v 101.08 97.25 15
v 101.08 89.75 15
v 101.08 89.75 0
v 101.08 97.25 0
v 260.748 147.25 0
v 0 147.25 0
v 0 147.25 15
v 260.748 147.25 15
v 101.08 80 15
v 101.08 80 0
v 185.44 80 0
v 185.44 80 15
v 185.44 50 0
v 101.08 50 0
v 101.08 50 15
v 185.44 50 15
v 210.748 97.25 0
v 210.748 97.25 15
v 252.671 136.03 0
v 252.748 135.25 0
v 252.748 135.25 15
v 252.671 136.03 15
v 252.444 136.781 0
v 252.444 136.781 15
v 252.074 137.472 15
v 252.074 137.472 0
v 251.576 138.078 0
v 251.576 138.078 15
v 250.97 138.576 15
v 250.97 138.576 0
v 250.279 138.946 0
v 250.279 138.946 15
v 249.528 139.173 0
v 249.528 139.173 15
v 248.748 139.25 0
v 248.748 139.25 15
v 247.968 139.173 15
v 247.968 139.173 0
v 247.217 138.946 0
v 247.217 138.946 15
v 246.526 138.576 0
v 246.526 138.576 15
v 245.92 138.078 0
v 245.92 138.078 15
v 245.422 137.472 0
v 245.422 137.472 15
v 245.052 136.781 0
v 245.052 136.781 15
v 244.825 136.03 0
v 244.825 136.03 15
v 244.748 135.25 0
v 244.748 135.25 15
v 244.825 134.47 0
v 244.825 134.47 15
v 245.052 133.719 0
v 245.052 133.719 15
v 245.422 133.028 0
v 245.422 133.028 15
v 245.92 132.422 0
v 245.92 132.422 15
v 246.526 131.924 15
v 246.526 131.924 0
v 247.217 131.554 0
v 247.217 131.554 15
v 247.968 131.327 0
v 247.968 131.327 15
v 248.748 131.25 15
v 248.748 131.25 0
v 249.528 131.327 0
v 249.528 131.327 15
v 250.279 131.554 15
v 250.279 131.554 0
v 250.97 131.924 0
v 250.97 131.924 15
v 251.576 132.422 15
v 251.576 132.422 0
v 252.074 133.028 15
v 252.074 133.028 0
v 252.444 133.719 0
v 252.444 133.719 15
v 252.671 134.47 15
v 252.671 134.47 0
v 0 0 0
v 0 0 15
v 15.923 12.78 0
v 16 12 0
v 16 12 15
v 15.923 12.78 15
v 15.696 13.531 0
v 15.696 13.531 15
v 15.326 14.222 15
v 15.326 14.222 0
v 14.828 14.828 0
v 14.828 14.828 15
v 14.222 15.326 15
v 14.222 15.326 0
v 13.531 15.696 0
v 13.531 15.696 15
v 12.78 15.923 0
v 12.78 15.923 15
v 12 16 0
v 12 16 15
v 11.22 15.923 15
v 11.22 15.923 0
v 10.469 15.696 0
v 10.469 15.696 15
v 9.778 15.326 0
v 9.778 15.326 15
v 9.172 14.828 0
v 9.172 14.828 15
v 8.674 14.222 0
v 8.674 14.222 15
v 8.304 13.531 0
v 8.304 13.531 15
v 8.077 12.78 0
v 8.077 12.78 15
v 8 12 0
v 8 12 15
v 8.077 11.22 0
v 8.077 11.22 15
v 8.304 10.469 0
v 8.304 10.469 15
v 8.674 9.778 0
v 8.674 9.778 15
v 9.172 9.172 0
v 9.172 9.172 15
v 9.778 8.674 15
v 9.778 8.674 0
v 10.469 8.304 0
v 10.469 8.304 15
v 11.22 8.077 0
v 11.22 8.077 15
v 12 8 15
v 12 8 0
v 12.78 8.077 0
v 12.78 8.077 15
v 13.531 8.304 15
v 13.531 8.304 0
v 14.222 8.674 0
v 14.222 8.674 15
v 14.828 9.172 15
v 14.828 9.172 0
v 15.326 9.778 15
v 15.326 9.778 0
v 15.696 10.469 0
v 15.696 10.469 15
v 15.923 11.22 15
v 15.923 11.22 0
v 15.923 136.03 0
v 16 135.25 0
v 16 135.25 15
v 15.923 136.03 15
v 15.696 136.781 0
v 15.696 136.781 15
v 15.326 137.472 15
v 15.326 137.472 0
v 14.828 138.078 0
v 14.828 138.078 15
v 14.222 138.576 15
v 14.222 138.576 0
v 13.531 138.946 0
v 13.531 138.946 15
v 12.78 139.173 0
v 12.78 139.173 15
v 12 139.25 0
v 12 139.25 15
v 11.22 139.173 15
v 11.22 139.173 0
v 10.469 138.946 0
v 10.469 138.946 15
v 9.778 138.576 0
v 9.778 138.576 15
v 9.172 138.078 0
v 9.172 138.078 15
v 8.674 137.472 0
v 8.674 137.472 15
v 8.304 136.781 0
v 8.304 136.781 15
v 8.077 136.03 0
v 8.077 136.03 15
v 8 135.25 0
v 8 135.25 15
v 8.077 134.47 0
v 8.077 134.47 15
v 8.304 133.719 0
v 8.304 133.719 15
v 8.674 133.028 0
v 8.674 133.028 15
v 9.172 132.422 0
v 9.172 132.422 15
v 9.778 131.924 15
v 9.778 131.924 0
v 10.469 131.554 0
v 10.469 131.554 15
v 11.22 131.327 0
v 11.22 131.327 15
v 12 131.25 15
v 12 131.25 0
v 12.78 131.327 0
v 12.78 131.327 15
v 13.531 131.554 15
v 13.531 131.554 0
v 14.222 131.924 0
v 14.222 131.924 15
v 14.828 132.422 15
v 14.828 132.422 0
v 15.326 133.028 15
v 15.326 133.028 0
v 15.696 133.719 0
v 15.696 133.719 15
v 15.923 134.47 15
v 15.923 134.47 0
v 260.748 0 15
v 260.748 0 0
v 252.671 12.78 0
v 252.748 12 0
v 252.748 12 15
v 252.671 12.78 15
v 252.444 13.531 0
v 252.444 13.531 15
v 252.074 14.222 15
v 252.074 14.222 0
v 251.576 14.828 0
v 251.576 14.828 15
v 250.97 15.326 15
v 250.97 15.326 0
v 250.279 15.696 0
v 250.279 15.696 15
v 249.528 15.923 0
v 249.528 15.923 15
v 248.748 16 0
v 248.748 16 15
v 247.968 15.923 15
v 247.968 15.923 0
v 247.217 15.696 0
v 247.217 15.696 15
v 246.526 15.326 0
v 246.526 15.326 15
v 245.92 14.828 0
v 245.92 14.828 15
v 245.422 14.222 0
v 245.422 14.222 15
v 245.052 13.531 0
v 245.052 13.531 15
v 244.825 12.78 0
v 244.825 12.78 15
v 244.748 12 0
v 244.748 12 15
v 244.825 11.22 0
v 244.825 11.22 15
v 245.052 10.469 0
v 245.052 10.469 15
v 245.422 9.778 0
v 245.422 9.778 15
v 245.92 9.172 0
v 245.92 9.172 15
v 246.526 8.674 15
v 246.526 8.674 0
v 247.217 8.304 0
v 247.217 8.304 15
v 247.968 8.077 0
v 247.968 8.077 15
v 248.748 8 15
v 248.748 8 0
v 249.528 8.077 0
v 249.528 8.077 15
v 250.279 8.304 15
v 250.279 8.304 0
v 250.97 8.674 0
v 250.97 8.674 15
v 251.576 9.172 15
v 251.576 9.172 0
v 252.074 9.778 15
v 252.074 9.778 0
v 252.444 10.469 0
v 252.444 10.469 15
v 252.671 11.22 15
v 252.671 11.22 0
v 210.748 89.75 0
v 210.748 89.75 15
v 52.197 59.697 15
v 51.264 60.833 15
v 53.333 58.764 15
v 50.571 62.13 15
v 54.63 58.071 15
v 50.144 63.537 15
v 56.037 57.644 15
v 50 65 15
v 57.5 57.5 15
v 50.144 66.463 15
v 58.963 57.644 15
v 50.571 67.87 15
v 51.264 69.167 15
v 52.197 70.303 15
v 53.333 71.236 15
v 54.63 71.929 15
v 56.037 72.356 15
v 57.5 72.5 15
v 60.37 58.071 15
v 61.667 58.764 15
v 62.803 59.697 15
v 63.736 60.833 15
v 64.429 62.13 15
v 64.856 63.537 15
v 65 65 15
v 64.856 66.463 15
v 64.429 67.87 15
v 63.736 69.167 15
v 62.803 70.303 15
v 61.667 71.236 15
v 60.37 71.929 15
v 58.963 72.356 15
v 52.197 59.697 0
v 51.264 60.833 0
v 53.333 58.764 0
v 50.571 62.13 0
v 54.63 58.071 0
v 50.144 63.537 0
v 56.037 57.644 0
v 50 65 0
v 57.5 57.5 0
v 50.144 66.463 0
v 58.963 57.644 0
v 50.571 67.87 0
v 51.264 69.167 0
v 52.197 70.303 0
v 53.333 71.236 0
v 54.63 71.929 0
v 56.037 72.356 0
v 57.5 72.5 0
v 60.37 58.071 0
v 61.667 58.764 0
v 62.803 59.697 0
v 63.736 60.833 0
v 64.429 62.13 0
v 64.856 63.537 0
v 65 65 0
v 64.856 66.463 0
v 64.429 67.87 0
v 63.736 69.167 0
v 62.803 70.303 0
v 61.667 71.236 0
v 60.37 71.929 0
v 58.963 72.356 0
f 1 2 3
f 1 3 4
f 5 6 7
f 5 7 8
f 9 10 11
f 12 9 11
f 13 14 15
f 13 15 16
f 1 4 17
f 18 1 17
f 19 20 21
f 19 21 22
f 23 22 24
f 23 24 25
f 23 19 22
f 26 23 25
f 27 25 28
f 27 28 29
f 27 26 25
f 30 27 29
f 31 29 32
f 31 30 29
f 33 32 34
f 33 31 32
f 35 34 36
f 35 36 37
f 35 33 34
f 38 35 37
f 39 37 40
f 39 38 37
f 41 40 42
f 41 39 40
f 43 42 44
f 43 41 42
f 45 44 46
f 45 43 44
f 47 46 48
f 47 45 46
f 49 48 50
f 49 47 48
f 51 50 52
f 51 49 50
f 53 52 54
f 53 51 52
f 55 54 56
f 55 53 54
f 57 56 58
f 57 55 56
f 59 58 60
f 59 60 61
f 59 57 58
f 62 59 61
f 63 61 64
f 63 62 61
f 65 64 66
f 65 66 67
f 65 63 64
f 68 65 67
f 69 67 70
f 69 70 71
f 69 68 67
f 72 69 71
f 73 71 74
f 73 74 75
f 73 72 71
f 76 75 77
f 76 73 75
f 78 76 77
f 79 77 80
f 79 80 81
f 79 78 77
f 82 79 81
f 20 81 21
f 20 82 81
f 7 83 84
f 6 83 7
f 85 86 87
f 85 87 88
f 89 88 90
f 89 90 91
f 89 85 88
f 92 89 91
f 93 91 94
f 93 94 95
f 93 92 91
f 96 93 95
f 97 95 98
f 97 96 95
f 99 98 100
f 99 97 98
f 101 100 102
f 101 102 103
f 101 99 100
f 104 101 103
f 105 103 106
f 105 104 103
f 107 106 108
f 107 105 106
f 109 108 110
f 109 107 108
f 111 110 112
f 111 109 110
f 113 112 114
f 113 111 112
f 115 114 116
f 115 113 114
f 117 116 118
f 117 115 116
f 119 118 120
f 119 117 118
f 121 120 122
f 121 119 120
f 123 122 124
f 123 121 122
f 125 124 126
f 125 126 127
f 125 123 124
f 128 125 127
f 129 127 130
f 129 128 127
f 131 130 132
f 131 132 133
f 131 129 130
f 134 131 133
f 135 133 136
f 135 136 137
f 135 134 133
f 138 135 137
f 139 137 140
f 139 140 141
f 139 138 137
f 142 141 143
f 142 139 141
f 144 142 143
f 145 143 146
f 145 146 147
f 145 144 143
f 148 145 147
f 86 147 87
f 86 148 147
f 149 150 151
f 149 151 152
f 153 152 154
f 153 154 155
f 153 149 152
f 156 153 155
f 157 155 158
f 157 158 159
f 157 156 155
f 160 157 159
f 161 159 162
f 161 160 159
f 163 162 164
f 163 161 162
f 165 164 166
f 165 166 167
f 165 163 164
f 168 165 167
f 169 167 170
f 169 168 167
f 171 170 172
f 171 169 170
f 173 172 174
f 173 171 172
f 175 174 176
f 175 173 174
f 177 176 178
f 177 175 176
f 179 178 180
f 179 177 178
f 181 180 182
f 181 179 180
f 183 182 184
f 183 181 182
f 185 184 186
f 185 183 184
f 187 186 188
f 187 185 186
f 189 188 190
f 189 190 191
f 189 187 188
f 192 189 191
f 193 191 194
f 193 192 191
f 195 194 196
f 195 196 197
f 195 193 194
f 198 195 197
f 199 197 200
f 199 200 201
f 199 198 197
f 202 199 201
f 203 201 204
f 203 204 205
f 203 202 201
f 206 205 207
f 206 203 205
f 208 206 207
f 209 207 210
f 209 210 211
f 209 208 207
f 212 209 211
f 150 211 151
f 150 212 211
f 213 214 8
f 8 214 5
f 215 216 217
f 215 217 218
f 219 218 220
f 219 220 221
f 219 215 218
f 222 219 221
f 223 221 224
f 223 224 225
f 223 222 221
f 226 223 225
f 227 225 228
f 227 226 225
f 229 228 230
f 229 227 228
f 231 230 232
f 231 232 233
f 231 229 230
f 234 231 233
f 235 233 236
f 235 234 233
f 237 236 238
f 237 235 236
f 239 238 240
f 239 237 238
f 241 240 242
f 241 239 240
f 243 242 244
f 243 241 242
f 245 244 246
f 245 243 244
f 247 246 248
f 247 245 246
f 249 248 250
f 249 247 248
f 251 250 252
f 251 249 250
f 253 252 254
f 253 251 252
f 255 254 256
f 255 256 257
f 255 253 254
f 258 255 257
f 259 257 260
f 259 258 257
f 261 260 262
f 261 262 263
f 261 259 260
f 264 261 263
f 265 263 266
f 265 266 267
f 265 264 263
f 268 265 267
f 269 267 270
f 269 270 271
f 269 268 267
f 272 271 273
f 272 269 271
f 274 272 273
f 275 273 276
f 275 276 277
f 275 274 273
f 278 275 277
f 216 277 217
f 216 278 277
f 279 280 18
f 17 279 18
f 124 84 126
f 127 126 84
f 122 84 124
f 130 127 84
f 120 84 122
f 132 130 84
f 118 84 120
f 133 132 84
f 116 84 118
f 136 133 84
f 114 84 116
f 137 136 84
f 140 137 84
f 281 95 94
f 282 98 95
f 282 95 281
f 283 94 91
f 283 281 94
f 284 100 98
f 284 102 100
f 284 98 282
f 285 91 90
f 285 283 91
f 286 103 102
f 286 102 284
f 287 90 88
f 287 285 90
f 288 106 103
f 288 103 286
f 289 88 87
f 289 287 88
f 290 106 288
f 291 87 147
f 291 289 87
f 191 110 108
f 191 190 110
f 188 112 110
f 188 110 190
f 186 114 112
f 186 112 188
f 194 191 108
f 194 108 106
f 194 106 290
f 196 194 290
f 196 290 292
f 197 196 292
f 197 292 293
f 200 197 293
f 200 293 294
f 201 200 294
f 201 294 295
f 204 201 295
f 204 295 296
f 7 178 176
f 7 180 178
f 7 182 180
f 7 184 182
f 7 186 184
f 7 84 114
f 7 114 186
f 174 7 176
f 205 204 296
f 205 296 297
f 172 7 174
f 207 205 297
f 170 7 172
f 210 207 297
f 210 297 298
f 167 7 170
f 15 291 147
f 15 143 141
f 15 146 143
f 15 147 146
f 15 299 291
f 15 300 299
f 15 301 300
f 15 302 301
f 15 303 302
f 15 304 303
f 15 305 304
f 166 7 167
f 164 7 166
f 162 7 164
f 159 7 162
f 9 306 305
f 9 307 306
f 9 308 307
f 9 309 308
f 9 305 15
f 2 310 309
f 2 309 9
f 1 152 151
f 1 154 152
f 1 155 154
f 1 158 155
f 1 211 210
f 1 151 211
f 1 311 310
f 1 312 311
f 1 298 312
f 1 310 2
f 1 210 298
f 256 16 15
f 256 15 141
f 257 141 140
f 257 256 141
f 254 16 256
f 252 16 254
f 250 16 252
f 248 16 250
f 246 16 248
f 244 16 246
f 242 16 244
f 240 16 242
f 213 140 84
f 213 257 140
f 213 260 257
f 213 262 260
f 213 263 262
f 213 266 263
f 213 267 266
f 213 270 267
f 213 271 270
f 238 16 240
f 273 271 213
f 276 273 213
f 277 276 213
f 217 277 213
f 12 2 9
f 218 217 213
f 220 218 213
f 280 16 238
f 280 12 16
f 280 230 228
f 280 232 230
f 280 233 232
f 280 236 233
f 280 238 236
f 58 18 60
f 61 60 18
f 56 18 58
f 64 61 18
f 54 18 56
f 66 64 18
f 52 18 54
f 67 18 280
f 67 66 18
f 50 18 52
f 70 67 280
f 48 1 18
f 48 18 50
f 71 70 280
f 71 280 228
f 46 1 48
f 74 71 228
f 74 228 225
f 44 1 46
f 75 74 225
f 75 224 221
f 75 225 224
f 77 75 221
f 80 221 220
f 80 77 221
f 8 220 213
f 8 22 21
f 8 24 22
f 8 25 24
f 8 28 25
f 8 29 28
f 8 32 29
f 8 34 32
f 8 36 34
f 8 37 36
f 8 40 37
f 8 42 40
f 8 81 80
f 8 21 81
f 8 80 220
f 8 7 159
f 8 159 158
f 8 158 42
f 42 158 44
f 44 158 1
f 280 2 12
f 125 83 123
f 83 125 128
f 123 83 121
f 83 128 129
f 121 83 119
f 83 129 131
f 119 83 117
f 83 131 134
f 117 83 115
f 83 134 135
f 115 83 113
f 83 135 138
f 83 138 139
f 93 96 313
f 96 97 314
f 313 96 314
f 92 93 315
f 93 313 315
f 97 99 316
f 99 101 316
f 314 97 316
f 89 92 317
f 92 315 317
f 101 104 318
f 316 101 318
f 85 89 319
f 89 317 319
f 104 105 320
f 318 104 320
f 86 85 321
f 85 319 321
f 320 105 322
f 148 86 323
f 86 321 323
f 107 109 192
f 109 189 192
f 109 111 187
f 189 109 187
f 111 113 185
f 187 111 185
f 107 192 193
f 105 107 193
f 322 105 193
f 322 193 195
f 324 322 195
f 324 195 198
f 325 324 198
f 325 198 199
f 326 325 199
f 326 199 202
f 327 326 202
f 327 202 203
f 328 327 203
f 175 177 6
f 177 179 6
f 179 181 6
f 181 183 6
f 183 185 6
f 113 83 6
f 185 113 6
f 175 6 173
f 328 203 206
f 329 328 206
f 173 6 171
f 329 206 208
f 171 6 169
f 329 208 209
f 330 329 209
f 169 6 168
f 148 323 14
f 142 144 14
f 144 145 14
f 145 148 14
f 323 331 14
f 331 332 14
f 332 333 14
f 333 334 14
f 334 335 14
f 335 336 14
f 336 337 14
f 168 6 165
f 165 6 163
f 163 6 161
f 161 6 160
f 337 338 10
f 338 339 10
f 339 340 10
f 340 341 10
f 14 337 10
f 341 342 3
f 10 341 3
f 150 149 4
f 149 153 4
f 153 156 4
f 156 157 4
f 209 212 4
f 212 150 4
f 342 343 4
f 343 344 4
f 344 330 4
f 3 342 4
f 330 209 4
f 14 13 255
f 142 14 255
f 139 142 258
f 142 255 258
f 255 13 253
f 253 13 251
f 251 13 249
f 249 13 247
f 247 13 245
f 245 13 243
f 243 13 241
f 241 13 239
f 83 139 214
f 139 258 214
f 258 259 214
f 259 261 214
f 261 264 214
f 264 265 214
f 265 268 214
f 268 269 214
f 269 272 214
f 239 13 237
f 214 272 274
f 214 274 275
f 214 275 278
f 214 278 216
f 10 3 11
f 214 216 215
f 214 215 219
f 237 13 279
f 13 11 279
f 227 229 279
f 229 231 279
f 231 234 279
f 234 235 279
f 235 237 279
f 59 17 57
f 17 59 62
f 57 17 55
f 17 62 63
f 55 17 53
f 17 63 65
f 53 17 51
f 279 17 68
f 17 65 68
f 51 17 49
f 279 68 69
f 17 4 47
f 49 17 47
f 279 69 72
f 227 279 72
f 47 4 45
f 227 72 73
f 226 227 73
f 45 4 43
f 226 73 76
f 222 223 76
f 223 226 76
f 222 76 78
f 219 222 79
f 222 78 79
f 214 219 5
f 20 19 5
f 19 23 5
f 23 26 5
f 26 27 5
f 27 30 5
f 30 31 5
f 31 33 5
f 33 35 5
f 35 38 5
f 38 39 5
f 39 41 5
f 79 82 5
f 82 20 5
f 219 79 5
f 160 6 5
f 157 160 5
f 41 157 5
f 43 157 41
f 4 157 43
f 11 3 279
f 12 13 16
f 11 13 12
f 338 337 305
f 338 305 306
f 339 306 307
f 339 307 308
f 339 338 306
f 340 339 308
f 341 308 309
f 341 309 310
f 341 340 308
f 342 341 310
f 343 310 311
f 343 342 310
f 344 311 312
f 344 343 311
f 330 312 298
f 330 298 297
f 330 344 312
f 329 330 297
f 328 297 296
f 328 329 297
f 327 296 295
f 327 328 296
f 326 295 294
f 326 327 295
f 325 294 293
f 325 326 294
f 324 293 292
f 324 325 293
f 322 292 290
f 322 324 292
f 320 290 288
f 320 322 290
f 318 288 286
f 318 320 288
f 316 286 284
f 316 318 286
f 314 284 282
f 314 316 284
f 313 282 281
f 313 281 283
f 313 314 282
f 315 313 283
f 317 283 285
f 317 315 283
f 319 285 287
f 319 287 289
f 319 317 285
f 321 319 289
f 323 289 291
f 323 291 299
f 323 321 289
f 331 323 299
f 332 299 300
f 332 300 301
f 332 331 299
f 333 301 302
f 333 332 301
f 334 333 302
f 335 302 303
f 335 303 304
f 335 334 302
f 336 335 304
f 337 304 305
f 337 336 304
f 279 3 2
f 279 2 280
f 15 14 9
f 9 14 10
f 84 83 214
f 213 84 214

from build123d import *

# Parameters (mm, degrees)
F0_W     = 260.748
F0_H     = 147.25
F0_R     = 4
F0_R_2   = 7.5
F0_W_2   = 84.36
F0_H_2   = 30
F0_W_3   = 109.668
F0_H_3   = 7.5
F1_DEPTH = 15


with BuildPart() as f1:
    # F0 (on Top) → F1 (new body)
    with BuildSketch(Plane.XY):
        with Locations((130.374, 73.625)):
            Rectangle(F0_W, F0_H)
        with Locations((12, 12)):
            Circle(F0_R, mode=Mode.SUBTRACT)
        with Locations((57.5, 65)):
            Circle(F0_R_2, mode=Mode.SUBTRACT)
        with Locations((248.748, 12)):
            Circle(F0_R, mode=Mode.SUBTRACT)
        with Locations((143.26, 65)):
            Rectangle(F0_W_2, F0_H_2, mode=Mode.SUBTRACT)
        with Locations((12, 135.25)):
            Circle(F0_R, mode=Mode.SUBTRACT)
        with Locations((155.914, 93.5)):
            Rectangle(F0_W_3, F0_H_3, mode=Mode.SUBTRACT)
        with Locations((248.748, 135.25)):
            Circle(F0_R, mode=Mode.SUBTRACT)
    extrude(amount=F1_DEPTH)


solid = f1.part
